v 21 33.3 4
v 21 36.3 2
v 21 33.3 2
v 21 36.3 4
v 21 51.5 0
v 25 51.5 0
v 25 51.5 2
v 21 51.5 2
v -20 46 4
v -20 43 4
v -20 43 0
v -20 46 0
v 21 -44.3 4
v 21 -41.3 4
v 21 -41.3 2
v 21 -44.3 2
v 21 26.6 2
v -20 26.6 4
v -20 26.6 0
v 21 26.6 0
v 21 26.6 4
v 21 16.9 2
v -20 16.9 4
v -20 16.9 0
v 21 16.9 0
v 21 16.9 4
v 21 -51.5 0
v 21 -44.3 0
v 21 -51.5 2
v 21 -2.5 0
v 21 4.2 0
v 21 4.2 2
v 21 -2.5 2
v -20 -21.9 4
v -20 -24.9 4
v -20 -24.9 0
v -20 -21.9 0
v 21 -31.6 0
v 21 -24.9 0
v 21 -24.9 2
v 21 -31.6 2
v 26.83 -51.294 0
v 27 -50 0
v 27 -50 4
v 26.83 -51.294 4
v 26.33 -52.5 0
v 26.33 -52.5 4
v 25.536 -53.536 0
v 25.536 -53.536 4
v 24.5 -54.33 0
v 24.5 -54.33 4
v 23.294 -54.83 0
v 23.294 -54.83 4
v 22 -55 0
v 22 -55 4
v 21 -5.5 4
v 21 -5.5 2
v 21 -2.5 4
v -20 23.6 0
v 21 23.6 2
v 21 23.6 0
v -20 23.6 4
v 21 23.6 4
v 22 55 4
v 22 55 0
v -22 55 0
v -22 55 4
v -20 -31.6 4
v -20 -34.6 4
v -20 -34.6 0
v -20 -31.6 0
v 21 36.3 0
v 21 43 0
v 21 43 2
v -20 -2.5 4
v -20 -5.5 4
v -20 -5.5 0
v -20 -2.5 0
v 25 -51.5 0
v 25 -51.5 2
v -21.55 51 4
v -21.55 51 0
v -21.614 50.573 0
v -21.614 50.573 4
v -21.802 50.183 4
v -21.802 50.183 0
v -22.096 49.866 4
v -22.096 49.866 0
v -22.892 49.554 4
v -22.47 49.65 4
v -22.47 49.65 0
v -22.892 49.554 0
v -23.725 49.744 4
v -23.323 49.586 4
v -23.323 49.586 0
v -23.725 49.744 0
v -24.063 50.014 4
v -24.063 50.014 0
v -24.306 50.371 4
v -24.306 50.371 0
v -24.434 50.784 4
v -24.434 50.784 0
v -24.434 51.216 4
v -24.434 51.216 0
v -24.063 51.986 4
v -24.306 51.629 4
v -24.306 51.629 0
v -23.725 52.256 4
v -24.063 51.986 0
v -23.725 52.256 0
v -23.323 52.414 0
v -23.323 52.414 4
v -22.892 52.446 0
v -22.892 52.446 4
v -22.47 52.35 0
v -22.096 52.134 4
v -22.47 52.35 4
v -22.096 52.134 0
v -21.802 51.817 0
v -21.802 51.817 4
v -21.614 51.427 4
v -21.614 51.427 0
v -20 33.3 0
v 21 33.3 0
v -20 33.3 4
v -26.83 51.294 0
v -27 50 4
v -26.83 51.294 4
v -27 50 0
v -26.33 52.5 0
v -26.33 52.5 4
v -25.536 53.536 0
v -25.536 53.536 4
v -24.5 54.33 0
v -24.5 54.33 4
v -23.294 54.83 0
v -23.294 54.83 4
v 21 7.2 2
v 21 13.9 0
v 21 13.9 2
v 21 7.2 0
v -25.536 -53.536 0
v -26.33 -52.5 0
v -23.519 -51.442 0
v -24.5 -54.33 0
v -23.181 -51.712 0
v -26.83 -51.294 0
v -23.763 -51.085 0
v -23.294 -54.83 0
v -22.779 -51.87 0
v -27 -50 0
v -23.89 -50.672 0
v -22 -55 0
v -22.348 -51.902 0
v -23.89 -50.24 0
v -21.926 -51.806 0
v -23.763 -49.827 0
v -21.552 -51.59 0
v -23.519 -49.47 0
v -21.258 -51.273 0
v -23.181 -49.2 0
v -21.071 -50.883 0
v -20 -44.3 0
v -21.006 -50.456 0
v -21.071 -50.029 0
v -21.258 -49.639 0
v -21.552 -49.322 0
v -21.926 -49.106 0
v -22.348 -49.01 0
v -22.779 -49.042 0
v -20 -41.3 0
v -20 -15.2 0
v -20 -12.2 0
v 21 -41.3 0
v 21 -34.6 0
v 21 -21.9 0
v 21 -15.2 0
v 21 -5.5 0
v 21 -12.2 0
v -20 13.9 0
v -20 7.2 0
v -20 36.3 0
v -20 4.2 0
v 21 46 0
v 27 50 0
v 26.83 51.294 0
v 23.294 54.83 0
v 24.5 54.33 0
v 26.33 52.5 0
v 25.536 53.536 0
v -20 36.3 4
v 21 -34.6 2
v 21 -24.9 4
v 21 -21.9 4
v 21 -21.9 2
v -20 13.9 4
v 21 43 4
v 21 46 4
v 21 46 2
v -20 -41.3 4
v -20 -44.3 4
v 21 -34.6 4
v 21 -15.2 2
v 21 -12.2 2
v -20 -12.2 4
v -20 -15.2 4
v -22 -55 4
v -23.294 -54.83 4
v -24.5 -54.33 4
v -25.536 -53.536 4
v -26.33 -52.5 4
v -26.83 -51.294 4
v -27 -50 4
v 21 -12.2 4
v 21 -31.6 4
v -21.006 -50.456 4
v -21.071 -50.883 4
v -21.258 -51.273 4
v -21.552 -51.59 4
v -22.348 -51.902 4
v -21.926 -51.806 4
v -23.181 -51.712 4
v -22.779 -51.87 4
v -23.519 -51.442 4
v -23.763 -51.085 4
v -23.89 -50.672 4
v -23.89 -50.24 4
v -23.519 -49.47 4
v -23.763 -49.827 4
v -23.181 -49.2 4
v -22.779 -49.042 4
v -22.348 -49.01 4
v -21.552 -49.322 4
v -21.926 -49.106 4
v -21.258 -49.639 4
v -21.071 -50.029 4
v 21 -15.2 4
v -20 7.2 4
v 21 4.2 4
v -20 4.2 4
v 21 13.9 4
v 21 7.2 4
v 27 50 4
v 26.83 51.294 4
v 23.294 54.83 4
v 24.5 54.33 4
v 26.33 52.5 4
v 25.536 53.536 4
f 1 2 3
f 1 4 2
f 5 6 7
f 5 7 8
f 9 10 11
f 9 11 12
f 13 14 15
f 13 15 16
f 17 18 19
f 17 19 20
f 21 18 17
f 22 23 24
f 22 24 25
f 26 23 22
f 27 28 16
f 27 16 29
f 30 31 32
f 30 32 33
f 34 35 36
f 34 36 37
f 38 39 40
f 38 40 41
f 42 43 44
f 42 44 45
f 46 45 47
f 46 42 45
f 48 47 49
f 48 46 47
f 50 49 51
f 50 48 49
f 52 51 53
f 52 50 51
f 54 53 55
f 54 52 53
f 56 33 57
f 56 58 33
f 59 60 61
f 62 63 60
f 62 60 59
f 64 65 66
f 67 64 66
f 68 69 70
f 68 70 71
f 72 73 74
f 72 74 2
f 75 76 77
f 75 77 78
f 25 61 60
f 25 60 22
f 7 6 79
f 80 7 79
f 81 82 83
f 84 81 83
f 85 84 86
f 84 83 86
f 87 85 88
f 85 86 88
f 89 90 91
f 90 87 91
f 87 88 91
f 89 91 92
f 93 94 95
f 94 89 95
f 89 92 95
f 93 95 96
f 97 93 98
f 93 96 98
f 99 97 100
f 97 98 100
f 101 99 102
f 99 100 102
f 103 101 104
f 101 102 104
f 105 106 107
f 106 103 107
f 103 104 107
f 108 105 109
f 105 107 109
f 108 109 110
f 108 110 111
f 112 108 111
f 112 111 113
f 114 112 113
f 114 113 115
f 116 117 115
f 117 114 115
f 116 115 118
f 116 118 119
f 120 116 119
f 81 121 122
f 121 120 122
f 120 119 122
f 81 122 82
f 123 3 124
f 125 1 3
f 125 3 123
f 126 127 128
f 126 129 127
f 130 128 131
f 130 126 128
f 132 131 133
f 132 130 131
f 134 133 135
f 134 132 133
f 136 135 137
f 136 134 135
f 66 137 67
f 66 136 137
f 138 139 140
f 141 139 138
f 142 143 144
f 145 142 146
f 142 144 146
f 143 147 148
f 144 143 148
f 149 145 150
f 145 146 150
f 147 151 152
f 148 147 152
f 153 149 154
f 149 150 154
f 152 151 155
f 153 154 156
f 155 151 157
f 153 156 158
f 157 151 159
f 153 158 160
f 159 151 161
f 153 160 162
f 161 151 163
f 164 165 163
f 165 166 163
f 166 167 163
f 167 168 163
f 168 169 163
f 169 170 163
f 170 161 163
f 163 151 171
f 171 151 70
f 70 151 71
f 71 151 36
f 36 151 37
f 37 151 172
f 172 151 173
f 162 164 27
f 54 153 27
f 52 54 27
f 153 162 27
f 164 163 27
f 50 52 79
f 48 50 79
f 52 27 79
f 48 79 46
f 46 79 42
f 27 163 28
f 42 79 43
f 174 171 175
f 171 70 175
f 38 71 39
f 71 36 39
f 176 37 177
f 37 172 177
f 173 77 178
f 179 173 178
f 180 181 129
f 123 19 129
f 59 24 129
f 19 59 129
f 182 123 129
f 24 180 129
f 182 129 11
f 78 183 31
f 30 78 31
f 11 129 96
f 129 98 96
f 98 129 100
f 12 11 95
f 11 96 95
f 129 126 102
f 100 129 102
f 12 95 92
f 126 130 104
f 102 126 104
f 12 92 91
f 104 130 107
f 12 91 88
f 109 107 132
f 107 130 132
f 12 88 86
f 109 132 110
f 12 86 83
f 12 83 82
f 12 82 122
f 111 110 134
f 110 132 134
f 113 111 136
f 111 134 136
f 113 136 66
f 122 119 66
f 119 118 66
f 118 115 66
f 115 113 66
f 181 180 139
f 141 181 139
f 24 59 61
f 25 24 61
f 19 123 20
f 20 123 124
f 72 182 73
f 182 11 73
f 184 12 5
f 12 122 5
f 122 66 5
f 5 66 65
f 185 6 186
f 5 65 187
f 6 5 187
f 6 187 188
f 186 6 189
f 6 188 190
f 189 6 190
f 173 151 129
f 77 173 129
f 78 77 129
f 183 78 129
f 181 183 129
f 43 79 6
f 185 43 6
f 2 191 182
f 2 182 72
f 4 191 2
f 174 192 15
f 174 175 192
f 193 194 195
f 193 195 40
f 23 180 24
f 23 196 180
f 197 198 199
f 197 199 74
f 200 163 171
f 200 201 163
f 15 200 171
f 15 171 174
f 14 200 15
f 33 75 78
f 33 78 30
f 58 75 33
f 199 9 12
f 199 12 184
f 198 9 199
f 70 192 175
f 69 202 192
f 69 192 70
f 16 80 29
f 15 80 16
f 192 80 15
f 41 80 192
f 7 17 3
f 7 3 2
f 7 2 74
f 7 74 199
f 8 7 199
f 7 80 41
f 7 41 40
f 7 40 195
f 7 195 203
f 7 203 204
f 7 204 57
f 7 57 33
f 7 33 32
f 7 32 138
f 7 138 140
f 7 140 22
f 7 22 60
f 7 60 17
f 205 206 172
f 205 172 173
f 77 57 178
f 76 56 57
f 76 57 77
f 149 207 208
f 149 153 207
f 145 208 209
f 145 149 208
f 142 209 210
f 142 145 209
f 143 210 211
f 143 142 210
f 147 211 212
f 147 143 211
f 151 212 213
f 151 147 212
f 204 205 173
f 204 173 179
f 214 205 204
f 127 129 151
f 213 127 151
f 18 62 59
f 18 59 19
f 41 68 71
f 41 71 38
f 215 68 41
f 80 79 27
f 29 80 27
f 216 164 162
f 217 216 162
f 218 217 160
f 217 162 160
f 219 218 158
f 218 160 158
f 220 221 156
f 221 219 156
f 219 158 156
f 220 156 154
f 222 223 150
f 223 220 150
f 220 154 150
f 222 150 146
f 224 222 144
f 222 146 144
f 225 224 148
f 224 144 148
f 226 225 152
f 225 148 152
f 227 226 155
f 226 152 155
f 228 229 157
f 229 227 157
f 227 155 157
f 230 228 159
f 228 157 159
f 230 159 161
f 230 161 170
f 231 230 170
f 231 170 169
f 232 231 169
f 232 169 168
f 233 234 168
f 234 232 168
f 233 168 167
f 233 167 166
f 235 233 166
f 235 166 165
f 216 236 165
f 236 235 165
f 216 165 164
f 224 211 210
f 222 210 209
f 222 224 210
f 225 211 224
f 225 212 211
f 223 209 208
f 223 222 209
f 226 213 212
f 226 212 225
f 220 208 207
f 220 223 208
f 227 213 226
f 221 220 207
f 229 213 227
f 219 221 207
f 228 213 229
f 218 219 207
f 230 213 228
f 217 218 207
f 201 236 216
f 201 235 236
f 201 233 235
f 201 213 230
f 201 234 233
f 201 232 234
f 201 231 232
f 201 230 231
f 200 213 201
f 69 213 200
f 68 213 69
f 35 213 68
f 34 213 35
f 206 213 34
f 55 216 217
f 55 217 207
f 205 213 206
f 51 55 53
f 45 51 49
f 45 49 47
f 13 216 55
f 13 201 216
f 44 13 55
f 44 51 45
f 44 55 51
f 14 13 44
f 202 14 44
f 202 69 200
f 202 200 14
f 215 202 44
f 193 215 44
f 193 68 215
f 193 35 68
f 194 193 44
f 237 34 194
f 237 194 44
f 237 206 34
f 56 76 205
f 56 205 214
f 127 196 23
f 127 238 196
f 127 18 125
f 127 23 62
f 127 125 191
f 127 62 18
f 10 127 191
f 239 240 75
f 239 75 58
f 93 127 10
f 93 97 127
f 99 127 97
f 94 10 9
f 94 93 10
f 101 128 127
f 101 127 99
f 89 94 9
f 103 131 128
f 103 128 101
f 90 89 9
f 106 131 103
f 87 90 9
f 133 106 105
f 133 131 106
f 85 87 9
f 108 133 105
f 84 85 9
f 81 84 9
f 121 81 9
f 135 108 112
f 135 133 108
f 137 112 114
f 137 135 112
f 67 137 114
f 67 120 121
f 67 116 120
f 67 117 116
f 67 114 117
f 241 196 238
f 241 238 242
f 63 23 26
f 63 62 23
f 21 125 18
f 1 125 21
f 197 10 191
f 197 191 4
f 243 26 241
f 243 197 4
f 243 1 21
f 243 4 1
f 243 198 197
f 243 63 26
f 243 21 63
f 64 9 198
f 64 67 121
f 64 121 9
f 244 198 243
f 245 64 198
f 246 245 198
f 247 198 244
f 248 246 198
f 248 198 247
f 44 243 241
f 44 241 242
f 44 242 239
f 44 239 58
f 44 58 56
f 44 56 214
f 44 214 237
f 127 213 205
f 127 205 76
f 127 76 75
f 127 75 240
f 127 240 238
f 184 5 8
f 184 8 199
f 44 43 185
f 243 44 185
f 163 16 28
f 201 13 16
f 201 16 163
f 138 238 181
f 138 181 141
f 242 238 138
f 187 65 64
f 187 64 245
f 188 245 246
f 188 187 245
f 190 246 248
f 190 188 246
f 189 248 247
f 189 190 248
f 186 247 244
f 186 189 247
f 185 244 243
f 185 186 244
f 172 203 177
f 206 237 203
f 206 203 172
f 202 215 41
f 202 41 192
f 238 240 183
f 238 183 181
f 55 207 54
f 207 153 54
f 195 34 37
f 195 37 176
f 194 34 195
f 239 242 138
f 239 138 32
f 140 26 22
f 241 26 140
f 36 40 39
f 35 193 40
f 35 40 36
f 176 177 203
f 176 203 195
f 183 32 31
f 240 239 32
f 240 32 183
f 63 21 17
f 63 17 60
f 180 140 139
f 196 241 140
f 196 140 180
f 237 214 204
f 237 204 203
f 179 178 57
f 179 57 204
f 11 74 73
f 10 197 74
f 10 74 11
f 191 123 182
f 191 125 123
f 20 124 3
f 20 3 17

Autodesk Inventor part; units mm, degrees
ref_plane "YZ Plane" through (0, 0, 0) normal (1, 0, 0) x (0, 1, 0)
ref_plane "XZ Plane" through (0, 0, 0) normal (0, 1, 0) x (-1, 0, 0)
ref_plane "XY Plane" through (0, 0, 0) normal (0, 0, 1) x (1, 0, 0)
ref_plane "Work Plane1" through (0, 0, 0) normal (0, 0, 1) x (1, 0, 0)
sketch "Sketch1" plane through (0, 0, 0) normal (0, 0, 1) x (1, 0, 0)
  circle A0 centre (-23, 51) radius 1.45 projected
  circle A1 centre (-22.4561, -50.4561) radius 1.45 projected
  arc A2 (-27, -50) -> (-22, -55) centre (-22, -50) ccw projected
  line L0 (-22, -55) -> (22, -55) projected
  arc A3 (22, -55) -> (27, -50) centre (22, -50) ccw projected
  line L1 (27, -50) -> (27, 50) projected
  arc A4 (27, 50) -> (22, 55) centre (22, 50) ccw projected
  line L2 (22, 55) -> (-22, 55) projected
  arc A5 (-22, 55) -> (-27, 50) centre (-22, 50) ccw projected
  line L3 (-27, 50) -> (-27, -50) projected
  line L4 (-22, 53) -> (22, 53) projected
  arc A6 (25, 50) -> (22, 53) centre (22, 50) ccw projected
  line L5 (25, 50) -> (25, -50) projected
  arc A7 (22, -53) -> (25, -50) centre (22, -50) ccw projected
  line L6 (22, -53) -> (-22, -53) projected
  arc A8 (-22, -53) -> (-25, -50) centre (-22.4561, -50.4561) ccw projected
  line L7 (-25, -50) -> (-25, 50) projected
  arc A9 (-25, 50) -> (-22, 53) centre (-23, 51) ccw projected
  point P0 (0, 0)
extrude "Extrusion1" add sketch "Sketch1" along normal blind 4 contours L3 A5 L2 A4 L1 A3 L0 A2 | L4 A6 L5 A7 L6 A8 L7 A9
sketch "Sketch2" plane through (0, 0, 0) normal (0, 0, -1) x (-1, 0, 0)
  line L0 (-25, 50) -> (-25, -50) projected
  line L1 (-25, 50) -> (-21, 50)
  line L2 (-21, 50) -> (-21, -50)
  line L3 (-21, -50) -> (-25, -50)
  line L4 (-25, -50) -> (-25, 50)
  line L5 (-21, 50) -> (-25, 50)
  line L6 (-25, 50) -> (-25, 51.5)
  line L7 (-25, 51.5) -> (-21, 51.5)
  line L8 (-21, 51.5) -> (-21, 50)
  line L9 (-21, -50) -> (-25, -50)
  line L10 (-25, -50) -> (-25, -51.5)
  line L11 (-25, -51.5) -> (-21, -51.5)
  line L12 (-21, -51.5) -> (-21, -50)
  point P0 (0, 0)
  dimension "d2" = 4
  dimension "d15" = 1.5
  dimension "d16" = 1.5
extrude "Extrusion2" cut sketch "Sketch2" against normal blind 2
sketch "Sketch3" plane through (0, 0, 4) normal (0, 0, 1) x (1, 0, 0)
  line L0 (21, 50) -> (21, -50) projected
  line L1 (-20, 46) -> (21, 46)
  line L2 (21, 46) -> (21, 43)
  line L3 (21, 43) -> (-20, 43)
  line L4 (-20, 43) -> (-20, 46)
  line L5 (21, 33.3) -> (-20, 33.3)
  line L6 (-20, 36.3) -> (21, 36.3)
  line L7 (21, 36.3) -> (21, 33.3)
  line L8 (-20, 33.3) -> (-20, 36.3)
  line L9 (21, 23.6) -> (-20, 23.6)
  line L10 (-20, 26.6) -> (21, 26.6)
  line L11 (21, 26.6) -> (21, 23.6)
  line L12 (-20, 23.6) -> (-20, 26.6)
  line L13 (21, 13.9) -> (-20, 13.9)
  line L14 (-20, 16.9) -> (21, 16.9)
  line L15 (21, 16.9) -> (21, 13.9)
  line L16 (-20, 13.9) -> (-20, 16.9)
  line L17 (21, 4.2) -> (-20, 4.2)
  line L18 (-20, 7.2) -> (21, 7.2)
  line L19 (21, 7.2) -> (21, 4.2)
  line L20 (-20, 4.2) -> (-20, 7.2)
  line L21 (21, -5.5) -> (-20, -5.5)
  line L22 (-20, -2.5) -> (21, -2.5)
  line L23 (21, -2.5) -> (21, -5.5)
  line L24 (-20, -5.5) -> (-20, -2.5)
  line L25 (21, -15.2) -> (-20, -15.2)
  line L26 (-20, -12.2) -> (21, -12.2)
  line L27 (21, -12.2) -> (21, -15.2)
  line L28 (-20, -15.2) -> (-20, -12.2)
  line L29 (21, -24.9) -> (-20, -24.9)
  line L30 (-20, -21.9) -> (21, -21.9)
  line L31 (21, -21.9) -> (21, -24.9)
  line L32 (-20, -24.9) -> (-20, -21.9)
  line L33 (21, -34.6) -> (-20, -34.6)
  line L34 (-20, -31.6) -> (21, -31.6)
  line L35 (21, -31.6) -> (21, -34.6)
  line L36 (-20, -34.6) -> (-20, -31.6)
  line L37 (21, -44.3) -> (-20, -44.3)
  line L38 (-20, -41.3) -> (21, -41.3)
  line L39 (21, -41.3) -> (21, -44.3)
  line L40 (-20, -44.3) -> (-20, -41.3)
  line L41 (22, 55) -> (-22, 55) projected
  point P0 (0, 0)
  point P1 (21, -41.3)
  point P2 (21, -31.6)
  point P3 (21, -21.9)
  point P4 (21, -12.2)
  point P5 (21, -2.5)
  point P6 (21, 7.2)
  point P7 (21, 16.9)
  point P8 (21, 26.6)
  point P9 (21, 36.3)
  point P10 (21, 46)
  dimension "d5" = 3
  dimension "d8" = 9.7
  dimension "d17" = 9
extrude "Extrusion3" cut sketch "Sketch3" against normal through all
properties part number "00_Case_Powersupply_Galvo_lid"
